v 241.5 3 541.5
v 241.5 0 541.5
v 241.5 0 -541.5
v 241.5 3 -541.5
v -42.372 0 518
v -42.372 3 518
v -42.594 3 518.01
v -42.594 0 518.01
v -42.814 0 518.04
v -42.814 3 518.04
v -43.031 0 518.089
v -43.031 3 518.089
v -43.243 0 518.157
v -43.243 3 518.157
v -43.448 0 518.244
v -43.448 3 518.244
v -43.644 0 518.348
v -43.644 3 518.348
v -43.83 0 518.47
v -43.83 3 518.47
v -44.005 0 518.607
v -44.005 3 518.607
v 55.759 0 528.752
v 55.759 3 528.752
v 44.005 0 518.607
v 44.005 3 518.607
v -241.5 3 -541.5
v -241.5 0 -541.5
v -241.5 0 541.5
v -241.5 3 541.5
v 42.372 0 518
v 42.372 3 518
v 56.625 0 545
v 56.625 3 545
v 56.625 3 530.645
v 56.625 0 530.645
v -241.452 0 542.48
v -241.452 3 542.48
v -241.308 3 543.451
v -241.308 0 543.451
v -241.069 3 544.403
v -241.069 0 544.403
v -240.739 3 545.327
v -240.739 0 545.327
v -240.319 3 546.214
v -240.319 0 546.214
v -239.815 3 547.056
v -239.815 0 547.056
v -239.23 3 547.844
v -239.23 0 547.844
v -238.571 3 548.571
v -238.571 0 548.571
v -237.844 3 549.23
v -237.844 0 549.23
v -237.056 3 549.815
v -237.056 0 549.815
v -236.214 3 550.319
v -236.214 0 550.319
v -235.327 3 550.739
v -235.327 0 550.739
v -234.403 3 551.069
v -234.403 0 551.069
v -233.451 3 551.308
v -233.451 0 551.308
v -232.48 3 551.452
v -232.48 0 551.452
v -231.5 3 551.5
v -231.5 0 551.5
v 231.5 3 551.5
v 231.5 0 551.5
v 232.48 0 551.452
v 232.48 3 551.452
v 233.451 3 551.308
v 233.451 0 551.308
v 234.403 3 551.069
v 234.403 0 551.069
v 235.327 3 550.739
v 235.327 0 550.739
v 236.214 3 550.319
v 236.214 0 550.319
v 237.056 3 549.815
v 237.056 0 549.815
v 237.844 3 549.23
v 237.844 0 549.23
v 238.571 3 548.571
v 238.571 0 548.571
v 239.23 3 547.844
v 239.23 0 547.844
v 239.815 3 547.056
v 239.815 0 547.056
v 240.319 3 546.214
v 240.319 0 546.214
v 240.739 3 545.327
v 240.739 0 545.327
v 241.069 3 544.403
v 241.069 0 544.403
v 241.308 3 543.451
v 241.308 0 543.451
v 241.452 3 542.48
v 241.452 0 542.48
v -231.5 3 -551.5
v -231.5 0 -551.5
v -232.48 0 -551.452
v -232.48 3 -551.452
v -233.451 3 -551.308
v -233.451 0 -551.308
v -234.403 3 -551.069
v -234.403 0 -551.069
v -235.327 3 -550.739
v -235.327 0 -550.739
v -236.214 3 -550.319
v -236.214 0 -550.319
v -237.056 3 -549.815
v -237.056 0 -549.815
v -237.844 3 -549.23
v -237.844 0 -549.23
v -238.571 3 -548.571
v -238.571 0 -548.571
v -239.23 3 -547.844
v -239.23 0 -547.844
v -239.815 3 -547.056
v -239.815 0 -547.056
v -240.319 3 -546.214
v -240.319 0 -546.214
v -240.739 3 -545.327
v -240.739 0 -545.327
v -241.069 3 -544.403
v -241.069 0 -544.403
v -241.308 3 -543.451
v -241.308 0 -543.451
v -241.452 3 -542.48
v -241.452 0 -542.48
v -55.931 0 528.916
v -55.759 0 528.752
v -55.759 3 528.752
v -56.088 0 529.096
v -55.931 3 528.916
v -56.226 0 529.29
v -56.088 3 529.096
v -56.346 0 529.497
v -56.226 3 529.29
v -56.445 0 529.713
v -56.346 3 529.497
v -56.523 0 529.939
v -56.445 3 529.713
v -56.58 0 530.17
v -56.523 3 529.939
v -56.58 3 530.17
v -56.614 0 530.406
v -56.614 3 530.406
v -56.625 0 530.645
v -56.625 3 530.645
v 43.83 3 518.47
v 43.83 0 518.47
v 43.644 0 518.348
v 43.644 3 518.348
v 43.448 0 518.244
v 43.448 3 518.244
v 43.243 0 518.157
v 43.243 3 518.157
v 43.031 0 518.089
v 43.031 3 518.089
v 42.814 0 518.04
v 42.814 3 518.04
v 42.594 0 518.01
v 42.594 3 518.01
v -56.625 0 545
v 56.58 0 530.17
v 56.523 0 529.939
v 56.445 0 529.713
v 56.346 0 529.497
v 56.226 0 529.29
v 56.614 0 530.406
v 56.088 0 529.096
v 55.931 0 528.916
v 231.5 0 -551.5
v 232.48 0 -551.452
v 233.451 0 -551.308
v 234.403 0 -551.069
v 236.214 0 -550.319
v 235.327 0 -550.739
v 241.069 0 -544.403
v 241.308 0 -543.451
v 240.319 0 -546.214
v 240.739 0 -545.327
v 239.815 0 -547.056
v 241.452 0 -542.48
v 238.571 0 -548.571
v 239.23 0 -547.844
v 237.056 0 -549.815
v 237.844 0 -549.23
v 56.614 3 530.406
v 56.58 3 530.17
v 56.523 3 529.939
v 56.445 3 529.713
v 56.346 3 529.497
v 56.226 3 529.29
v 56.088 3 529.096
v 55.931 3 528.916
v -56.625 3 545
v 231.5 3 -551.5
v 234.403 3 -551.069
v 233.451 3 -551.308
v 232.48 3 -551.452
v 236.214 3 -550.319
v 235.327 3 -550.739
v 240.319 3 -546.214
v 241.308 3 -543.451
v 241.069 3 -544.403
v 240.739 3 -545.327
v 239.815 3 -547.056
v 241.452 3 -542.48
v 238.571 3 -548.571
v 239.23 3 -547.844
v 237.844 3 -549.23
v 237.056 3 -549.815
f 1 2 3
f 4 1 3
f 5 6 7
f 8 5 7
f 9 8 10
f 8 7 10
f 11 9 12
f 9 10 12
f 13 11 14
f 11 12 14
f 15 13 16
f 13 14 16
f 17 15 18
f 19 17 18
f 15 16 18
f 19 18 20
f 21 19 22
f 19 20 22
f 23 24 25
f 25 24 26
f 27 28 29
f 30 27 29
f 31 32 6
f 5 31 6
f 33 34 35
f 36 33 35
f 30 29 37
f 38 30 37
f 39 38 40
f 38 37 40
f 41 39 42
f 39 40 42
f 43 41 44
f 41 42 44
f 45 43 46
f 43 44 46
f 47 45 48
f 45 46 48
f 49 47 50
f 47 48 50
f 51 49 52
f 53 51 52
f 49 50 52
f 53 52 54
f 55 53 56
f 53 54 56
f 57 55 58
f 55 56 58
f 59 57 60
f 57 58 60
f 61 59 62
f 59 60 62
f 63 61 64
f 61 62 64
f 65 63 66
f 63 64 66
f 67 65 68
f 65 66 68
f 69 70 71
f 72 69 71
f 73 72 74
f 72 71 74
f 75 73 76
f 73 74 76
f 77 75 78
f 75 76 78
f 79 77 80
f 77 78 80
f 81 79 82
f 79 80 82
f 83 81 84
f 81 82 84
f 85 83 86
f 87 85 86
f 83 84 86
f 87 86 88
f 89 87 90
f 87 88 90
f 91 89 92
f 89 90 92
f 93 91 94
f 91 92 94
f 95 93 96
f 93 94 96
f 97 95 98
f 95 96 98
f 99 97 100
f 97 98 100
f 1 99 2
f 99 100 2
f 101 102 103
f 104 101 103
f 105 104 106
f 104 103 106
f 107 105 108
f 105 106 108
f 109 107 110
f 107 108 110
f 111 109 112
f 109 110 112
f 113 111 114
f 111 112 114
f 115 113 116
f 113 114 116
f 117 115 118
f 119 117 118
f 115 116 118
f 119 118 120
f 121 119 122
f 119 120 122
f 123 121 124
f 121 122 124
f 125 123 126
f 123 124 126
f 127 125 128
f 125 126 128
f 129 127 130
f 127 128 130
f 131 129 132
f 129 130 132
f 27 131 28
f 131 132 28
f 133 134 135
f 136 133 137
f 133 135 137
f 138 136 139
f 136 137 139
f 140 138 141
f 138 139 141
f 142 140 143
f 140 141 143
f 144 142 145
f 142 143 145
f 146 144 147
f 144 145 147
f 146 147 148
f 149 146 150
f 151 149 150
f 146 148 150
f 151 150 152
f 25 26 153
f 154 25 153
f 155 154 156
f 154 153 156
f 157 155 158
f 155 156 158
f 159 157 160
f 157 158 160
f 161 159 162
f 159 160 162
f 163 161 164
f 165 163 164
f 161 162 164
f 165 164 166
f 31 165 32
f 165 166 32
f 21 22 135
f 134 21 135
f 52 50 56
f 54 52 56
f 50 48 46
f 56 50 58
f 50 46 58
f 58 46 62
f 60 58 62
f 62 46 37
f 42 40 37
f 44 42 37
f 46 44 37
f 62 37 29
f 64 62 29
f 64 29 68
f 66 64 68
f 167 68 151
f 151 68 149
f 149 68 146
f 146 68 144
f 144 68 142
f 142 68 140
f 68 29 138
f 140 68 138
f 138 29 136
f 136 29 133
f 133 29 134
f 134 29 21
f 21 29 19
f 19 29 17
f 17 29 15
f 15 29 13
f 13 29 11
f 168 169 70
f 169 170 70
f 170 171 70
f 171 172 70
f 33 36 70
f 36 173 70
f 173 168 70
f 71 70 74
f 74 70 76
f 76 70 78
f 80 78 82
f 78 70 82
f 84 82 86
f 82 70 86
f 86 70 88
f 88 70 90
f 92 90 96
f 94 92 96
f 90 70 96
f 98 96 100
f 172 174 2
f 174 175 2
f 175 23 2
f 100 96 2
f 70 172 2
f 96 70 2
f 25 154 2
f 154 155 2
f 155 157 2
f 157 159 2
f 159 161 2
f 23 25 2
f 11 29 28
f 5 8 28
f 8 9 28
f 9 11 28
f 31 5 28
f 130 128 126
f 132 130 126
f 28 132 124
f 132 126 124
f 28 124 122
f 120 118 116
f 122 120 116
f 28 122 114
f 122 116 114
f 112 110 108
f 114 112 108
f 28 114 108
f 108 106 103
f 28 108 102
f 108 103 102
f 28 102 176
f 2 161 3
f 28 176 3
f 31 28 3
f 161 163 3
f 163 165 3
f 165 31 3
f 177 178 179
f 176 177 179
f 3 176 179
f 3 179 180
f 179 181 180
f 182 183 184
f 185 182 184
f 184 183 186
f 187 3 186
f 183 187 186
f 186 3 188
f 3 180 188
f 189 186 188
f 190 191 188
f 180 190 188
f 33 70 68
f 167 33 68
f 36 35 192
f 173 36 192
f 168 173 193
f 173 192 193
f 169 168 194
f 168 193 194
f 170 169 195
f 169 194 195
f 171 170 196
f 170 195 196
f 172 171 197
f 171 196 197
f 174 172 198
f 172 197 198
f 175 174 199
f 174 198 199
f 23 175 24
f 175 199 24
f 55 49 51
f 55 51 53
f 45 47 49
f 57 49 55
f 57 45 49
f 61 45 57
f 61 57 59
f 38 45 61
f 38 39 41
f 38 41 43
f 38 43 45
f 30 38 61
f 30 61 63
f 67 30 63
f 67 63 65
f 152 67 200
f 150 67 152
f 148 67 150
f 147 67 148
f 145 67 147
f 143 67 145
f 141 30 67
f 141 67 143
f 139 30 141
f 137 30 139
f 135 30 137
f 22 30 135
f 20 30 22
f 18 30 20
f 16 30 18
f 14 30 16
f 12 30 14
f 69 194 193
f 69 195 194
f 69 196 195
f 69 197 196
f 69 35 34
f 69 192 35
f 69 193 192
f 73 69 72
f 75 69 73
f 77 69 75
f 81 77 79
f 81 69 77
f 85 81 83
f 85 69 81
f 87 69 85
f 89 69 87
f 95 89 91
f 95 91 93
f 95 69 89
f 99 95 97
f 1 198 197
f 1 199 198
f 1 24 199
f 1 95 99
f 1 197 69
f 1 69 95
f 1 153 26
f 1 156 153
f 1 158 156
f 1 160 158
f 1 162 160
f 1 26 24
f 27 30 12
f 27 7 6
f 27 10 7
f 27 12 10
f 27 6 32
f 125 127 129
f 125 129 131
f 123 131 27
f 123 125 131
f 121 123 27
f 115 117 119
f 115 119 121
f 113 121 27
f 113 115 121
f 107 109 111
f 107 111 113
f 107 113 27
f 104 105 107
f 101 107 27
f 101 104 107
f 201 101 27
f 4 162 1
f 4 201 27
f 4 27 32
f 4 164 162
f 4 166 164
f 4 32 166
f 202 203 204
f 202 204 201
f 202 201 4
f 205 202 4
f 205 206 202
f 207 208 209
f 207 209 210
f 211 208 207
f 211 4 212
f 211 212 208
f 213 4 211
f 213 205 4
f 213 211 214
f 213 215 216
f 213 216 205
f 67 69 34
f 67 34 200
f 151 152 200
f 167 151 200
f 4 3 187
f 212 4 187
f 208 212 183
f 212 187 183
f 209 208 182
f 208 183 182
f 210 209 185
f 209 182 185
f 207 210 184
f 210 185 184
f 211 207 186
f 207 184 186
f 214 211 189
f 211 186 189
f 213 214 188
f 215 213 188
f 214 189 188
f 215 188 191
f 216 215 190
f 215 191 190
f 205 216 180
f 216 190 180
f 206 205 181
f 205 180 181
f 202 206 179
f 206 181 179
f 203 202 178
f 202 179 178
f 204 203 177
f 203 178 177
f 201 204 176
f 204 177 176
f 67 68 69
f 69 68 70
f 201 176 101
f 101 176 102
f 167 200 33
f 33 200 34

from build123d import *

# Parameters (mm, degrees)
BOSS_EXTRUDE1_DEPTH = 3
CUT_EXTRUDE1_DEPTH  = 4


with BuildPart() as part:
    # Sketch1 → Boss-Extrude1 (new body)
    with BuildSketch(Plane(origin=(0, 0, 0), x_dir=(1, 0, 0), z_dir=(0, 1, 0))):
        with BuildLine():
            Line((-231.5, -551.5), (231.5, -551.5))
            ThreePointArc((231.5, -551.5), (238.571067812, -548.571067812), (241.5, -541.5))
            Line((241.5, -541.5), (241.5, 541.5))
            ThreePointArc((241.5, 541.5), (238.571067812, 548.571067812), (231.5, 551.5))
            Line((231.5, 551.5), (-231.5, 551.5))
            ThreePointArc((-231.5, 551.5), (-238.571067812, 548.571067812), (-241.5, 541.5))
            Line((-241.5, 541.5), (-241.5, -541.5))
            ThreePointArc((-241.5, -541.5), (-238.571067812, -548.571067812), (-231.5, -551.5))
        make_face()
    extrude(amount=BOSS_EXTRUDE1_DEPTH)

    # Sketch2 → Cut-Extrude1 (cut, through all)
    with BuildSketch(Plane(origin=(0, 3, 0), x_dir=(1, 0, 0), z_dir=(0, 1, 0))):
        with BuildLine():
            Line((-56.625, -545), (56.625, -545))
            Line((56.625, -545), (56.625, -530.644630074))
            ThreePointArc((56.625, -530.644630074), (56.398076263, -529.603897494), (55.758500558, -528.752098455))
            Line((55.758500558, -528.752098455), (44.005193779, -518.607468381))
            ThreePointArc((44.005193779, -518.607468381), (43.243091796, -518.156783296), (42.371693222, -518))
            Line((42.371693222, -518), (-42.371693222, -518))
            ThreePointArc((-42.371693222, -518), (-43.243091796, -518.156783296), (-44.005193779, -518.607468381))
            Line((-44.005193779, -518.607468381), (-55.758500558, -528.752098455))
            ThreePointArc((-55.758500558, -528.752098455), (-56.398076263, -529.603897494), (-56.625, -530.644630074))
            Line((-56.625, -530.644630074), (-56.625, -545))
        make_face()
    extrude(amount=-CUT_EXTRUDE1_DEPTH, mode=Mode.SUBTRACT)


solid = part.part
